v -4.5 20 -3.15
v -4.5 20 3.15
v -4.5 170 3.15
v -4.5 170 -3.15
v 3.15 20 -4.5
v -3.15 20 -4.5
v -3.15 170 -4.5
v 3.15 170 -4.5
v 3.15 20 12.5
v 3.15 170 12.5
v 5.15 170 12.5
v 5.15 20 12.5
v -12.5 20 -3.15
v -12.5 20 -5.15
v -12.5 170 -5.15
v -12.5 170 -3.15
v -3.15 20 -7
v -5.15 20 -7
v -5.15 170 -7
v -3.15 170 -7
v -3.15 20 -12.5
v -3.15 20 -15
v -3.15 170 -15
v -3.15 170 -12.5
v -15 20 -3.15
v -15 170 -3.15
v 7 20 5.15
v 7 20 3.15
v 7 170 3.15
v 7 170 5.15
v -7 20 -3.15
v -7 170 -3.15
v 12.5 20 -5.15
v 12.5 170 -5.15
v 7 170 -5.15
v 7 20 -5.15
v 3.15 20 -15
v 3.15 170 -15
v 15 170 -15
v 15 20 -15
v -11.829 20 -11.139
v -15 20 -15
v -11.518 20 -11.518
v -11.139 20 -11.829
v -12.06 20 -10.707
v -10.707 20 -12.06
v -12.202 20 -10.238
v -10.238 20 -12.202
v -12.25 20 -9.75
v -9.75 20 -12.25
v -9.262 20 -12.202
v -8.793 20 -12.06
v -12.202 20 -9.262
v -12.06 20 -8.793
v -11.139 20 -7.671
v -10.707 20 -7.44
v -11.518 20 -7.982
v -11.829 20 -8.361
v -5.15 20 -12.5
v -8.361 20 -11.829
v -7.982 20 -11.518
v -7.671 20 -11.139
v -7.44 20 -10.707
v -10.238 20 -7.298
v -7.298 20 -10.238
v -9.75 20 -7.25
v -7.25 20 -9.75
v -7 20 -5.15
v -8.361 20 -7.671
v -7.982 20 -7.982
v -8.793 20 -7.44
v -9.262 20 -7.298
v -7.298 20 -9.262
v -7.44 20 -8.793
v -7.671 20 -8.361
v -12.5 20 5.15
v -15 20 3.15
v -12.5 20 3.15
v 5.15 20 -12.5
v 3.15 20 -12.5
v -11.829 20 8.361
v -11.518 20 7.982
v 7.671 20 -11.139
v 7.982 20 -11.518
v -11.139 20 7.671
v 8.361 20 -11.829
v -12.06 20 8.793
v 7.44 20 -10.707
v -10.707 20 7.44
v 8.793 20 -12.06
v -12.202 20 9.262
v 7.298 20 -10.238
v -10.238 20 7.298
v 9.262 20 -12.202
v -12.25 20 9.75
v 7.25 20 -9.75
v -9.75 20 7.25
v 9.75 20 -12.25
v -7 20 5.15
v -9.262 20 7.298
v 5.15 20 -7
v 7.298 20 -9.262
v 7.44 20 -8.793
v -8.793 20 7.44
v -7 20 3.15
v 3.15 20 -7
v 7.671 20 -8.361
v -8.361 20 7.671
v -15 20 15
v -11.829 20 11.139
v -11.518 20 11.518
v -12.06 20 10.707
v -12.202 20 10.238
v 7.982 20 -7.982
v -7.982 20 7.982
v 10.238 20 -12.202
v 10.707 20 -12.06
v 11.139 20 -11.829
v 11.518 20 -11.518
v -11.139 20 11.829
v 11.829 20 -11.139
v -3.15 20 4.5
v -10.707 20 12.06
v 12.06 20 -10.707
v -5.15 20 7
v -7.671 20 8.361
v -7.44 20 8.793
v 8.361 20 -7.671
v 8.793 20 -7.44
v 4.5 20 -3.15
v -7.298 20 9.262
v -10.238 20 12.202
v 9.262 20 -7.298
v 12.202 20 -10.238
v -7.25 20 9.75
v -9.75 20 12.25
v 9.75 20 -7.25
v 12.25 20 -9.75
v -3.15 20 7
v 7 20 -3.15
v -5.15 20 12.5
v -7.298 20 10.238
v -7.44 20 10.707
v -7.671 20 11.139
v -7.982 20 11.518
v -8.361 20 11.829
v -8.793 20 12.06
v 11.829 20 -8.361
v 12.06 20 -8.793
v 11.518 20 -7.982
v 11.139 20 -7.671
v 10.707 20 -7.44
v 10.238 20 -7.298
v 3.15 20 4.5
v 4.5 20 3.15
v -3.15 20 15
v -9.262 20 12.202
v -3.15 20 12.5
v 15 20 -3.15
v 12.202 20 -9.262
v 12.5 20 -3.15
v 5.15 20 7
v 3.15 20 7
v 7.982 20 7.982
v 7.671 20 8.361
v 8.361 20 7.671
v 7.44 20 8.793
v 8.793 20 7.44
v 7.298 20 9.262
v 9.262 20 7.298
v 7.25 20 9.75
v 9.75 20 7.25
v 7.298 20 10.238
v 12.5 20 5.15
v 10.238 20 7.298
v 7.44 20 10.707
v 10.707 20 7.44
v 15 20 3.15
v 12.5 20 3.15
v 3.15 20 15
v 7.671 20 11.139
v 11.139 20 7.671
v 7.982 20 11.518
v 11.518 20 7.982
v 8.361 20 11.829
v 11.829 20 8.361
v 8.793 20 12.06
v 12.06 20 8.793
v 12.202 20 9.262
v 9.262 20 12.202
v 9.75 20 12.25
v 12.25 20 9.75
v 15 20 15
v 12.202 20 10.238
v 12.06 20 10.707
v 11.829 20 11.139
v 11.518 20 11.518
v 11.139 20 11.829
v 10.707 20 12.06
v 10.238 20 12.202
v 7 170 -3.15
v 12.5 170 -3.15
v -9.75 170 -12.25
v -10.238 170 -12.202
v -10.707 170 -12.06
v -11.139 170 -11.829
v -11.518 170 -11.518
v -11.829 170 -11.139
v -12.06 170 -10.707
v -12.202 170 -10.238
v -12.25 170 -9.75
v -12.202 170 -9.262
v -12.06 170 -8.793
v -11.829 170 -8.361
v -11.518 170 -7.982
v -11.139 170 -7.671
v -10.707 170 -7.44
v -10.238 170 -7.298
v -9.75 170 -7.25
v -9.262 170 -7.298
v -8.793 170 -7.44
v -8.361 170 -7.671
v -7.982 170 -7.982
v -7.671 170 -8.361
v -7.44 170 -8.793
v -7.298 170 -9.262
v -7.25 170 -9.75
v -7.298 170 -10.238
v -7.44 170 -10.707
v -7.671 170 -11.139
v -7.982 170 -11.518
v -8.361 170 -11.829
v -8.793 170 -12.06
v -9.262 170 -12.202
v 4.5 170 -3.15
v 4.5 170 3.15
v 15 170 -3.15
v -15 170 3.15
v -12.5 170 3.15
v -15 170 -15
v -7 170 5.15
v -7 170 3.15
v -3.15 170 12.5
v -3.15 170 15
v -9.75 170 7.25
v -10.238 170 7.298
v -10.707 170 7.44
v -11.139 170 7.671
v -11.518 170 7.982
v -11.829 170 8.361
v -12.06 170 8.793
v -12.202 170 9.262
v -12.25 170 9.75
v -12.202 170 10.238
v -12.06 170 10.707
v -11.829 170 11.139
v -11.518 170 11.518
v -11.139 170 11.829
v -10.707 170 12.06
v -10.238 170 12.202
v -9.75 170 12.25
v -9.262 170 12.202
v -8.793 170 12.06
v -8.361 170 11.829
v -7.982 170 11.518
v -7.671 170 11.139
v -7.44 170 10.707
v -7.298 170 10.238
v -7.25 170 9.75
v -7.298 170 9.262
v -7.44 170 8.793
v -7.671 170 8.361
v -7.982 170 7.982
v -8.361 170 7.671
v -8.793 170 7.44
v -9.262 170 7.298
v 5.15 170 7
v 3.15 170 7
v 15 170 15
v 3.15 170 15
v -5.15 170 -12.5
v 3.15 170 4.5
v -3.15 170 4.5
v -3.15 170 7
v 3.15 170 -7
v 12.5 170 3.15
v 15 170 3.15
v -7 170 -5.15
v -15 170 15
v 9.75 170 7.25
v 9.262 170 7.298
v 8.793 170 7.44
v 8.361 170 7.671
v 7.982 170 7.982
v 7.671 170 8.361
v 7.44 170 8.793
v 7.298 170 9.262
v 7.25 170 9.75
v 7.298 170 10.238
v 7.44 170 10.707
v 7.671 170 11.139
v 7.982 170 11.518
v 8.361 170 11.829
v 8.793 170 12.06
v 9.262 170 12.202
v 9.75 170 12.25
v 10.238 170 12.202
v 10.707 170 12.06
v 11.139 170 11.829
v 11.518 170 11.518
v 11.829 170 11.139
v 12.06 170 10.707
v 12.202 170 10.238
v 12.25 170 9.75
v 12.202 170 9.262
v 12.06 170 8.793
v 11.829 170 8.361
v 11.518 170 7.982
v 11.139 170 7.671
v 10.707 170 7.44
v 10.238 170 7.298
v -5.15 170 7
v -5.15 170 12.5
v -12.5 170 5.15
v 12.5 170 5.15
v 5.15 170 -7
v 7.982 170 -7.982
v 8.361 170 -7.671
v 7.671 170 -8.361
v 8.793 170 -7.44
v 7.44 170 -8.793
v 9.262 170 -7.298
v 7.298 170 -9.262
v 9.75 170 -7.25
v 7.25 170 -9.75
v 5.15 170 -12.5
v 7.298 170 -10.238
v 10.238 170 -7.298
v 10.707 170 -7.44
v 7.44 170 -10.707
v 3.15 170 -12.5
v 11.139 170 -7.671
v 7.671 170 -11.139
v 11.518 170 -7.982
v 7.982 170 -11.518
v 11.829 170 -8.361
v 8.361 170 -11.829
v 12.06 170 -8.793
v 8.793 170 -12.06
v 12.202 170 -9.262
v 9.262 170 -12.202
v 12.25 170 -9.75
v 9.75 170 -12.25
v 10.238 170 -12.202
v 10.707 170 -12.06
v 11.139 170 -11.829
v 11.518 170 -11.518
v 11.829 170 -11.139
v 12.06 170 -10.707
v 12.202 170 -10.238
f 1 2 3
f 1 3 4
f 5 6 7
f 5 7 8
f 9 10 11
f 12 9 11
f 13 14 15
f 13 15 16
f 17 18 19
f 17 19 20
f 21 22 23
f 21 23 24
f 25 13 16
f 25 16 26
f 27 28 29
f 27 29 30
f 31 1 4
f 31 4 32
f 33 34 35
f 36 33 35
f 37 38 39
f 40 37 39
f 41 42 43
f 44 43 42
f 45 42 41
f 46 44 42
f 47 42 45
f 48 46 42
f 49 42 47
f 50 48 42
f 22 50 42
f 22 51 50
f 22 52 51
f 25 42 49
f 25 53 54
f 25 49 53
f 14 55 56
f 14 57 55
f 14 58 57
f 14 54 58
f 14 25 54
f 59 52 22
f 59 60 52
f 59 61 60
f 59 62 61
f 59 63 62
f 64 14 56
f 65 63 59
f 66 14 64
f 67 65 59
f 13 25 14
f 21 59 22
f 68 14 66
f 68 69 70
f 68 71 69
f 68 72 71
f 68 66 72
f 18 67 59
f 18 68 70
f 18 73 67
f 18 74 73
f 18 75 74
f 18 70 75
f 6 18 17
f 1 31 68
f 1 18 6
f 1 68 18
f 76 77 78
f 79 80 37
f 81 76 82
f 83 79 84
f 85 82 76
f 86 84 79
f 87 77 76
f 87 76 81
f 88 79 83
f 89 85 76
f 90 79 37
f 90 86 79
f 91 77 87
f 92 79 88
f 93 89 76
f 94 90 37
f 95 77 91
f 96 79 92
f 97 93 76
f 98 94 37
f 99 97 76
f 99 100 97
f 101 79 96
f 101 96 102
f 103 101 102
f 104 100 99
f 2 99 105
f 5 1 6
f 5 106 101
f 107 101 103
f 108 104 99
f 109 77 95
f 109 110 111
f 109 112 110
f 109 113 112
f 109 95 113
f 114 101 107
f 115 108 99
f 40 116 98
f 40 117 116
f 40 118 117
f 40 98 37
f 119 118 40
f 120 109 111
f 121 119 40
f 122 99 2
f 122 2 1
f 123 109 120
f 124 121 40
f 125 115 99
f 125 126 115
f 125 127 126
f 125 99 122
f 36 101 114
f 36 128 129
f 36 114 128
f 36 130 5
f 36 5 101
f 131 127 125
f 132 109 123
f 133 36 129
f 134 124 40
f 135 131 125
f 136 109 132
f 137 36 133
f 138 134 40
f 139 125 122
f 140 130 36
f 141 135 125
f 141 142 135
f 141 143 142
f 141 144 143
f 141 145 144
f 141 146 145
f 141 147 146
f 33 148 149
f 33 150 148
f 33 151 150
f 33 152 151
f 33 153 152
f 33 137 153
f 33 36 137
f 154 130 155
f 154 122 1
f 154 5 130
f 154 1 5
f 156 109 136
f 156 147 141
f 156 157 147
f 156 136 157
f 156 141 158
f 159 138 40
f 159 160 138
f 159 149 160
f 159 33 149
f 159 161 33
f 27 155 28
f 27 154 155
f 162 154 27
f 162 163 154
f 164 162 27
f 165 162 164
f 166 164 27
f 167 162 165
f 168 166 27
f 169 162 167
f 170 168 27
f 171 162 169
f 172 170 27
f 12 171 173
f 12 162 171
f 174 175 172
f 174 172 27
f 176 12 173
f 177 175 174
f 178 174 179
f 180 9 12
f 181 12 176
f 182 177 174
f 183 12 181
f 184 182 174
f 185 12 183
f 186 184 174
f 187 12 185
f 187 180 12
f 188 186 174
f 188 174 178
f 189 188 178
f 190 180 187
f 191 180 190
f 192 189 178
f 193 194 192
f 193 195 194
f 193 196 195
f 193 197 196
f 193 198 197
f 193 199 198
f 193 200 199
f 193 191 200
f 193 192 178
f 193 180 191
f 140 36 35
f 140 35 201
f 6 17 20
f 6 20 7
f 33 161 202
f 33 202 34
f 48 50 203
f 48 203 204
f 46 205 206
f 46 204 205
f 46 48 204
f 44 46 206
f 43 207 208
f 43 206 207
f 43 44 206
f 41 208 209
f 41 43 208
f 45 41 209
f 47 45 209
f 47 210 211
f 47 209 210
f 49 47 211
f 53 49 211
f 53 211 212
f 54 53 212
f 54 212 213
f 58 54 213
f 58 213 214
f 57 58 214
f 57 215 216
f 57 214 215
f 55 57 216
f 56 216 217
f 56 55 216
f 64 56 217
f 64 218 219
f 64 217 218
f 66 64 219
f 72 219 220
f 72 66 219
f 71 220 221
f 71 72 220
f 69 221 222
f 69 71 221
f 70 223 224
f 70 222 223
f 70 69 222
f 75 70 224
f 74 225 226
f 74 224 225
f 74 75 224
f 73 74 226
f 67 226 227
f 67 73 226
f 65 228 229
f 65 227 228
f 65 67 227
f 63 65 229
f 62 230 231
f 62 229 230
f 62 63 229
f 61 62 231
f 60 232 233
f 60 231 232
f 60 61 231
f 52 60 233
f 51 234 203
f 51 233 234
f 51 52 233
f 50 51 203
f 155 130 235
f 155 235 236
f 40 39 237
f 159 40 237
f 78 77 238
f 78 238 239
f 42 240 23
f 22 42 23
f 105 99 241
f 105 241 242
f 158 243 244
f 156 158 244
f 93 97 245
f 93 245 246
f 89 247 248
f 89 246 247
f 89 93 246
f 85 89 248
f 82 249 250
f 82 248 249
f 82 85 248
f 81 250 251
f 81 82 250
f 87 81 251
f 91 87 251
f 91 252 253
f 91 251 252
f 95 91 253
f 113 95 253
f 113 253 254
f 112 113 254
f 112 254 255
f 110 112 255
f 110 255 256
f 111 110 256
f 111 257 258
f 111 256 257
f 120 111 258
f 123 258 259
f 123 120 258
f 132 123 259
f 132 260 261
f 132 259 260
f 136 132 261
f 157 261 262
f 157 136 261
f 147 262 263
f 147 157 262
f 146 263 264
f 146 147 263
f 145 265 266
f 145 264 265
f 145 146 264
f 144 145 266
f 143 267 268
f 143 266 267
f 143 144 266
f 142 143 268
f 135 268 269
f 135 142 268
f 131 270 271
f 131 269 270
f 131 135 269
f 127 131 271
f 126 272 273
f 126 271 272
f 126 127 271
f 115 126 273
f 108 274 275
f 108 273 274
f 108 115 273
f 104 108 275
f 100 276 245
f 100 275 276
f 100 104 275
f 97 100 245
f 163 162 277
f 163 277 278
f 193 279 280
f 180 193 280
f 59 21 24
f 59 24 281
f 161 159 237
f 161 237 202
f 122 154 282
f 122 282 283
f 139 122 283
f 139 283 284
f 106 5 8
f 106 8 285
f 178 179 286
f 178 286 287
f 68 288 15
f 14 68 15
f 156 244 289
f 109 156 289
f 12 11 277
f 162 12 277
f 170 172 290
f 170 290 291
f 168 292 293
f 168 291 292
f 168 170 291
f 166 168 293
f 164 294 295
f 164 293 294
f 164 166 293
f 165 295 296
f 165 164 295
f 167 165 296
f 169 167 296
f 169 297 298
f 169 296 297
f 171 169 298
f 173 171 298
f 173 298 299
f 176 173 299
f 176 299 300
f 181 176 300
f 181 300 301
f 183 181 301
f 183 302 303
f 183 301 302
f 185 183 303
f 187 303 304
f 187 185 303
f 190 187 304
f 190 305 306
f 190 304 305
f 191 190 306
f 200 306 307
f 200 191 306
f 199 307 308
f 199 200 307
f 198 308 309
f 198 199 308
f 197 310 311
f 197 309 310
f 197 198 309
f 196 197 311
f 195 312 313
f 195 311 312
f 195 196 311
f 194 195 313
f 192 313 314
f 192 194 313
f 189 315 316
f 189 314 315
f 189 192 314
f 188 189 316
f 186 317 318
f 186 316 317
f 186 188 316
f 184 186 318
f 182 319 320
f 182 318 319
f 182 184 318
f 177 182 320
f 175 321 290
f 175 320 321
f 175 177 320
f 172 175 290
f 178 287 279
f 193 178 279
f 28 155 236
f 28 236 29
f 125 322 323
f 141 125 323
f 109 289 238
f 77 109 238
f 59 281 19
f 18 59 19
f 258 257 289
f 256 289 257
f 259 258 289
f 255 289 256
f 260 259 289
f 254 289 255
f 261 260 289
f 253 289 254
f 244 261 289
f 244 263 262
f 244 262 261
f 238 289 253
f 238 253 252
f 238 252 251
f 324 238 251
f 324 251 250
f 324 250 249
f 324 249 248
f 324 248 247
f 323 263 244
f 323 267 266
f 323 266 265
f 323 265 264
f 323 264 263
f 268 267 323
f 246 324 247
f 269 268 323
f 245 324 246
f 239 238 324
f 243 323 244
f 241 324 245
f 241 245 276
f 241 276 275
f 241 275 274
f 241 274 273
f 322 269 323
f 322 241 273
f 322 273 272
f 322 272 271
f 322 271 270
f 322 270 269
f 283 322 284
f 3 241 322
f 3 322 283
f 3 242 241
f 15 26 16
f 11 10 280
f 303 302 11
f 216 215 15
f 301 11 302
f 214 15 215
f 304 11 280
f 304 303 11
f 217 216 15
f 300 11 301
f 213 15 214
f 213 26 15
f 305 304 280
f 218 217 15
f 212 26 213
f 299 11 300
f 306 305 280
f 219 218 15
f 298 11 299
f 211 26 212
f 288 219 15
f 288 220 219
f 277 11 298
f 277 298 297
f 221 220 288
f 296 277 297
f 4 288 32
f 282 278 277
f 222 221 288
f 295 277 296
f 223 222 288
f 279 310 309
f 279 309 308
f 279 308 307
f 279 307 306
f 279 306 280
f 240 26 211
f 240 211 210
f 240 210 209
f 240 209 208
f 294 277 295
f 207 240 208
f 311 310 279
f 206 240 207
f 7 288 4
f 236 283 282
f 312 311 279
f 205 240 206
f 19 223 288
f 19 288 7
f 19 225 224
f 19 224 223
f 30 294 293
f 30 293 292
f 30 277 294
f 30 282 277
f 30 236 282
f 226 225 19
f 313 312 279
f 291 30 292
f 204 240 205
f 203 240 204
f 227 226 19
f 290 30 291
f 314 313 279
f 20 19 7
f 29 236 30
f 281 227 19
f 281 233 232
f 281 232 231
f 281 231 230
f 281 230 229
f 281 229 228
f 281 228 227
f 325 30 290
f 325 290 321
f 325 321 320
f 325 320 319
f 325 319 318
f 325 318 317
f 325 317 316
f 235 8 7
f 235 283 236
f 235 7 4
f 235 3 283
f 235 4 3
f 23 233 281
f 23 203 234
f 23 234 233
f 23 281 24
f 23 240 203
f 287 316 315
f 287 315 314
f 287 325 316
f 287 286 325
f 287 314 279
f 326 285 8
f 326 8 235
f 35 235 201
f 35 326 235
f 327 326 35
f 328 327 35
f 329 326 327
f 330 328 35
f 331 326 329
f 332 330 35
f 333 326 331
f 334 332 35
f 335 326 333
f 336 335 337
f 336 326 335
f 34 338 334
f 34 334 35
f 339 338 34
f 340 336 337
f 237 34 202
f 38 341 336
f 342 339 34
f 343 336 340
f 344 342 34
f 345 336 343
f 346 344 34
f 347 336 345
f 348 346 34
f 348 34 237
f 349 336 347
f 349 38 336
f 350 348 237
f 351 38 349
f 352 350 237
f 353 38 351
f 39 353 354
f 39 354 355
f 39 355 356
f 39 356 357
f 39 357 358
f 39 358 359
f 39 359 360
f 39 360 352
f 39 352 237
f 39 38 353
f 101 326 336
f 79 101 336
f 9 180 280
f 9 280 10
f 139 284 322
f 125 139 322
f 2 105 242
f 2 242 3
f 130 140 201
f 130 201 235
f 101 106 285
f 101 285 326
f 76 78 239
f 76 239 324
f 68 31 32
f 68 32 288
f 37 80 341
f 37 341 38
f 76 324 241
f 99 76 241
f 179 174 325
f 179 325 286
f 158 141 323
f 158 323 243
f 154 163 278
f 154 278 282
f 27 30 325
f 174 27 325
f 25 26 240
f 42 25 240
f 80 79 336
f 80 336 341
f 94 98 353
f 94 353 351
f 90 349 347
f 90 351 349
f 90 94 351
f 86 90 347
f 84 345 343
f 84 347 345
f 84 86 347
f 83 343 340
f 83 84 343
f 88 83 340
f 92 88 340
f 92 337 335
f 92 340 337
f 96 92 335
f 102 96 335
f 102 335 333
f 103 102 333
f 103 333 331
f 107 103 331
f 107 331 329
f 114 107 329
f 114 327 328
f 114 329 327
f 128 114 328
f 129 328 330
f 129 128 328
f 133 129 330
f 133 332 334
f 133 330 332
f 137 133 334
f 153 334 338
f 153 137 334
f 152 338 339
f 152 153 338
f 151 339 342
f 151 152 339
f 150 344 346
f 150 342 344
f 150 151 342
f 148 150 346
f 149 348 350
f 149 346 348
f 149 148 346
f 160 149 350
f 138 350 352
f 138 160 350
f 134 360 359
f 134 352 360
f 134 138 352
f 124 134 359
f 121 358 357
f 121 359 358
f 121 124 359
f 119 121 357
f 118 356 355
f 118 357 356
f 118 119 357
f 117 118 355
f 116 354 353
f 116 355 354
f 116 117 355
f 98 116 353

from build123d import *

# Parameters (mm, degrees)
SKETCH_1_R          = 2.5
EXTRUDE_1_DEPTH     = 180
SKETCH_2_R          = 82.250528809
CUT_EXTRUDE_1_DEPTH = 10
SKETCH_3_R          = 47.359827943
CUT_EXTRUDE_2_DEPTH = 200


with BuildPart() as part:
    # 草图1 → 凸台-拉伸1 (new, symmetric)
    with BuildSketch(Plane(origin=(0, 0, 0), x_dir=(1, 0, 0), z_dir=(0, 1, 0))):
        Polygon((-15, -3.15), (-12.5, -3.15), (-12.5, -5.15), (-7, -5.15), (-7, -3.15), (-4.5, -3.15), (-4.5, 3.15), (-7, 3.15), (-7, 5.15), (-12.5, 5.15), (-12.5, 3.15), (-15, 3.15), (-15, 15), (-3.15, 15), (-3.15, 12.5), (-5.15, 12.5), (-5.15, 7), (-3.15, 7), (-3.15, 4.5), (3.15, 4.5), (3.15, 7), (5.15, 7), (5.15, 12.5), (3.15, 12.5), (3.15, 15), (15, 15), (15, 3.15), (12.5, 3.15), (12.5, 5.15), (7, 5.15), (7, 3.15), (4.5, 3.15), (4.5, -3.15), (7, -3.15), (7, -5.15), (12.5, -5.15), (12.5, -3.15), (15, -3.15), (15, -15), (3.15, -15), (3.15, -12.5), (5.15, -12.5), (5.15, -7), (3.15, -7), (3.15, -4.5), (-3.15, -4.5), (-3.15, -7), (-5.15, -7), (-5.15, -12.5), (-3.15, -12.5), (-3.15, -15), (-15, -15), align=None)
        with Locations(Location((-9.75, -9.75, 0), (0, 0, 90))):
            Circle(SKETCH_1_R, mode=Mode.SUBTRACT)
        with Locations(Location((-9.75, 9.75, 0), (0, 0, 90))):
            Circle(SKETCH_1_R, mode=Mode.SUBTRACT)
        with Locations(Location((9.75, 9.75, 0), (0, 0, 90))):
            Circle(SKETCH_1_R, mode=Mode.SUBTRACT)
        with Locations(Location((9.75, -9.75, 0), (0, 0, 90))):
            Circle(SKETCH_1_R, mode=Mode.SUBTRACT)
    extrude(amount=EXTRUDE_1_DEPTH, both=True)

    # 草图2 → 切除-拉伸1 (cut)
    with BuildSketch(Plane(origin=(0, 180, 0), x_dir=(1, 0, 0), z_dir=(0, 1, 0))):
        Circle(SKETCH_2_R)
    extrude(amount=-CUT_EXTRUDE_1_DEPTH, mode=Mode.SUBTRACT)

    # 草图3 → 切除-拉伸2 (cut)
    with BuildSketch(Plane.XZ.offset(180)):
        with Locations((0.216432031, -1.772037256)):
            Circle(SKETCH_3_R)
    extrude(amount=-CUT_EXTRUDE_2_DEPTH, mode=Mode.SUBTRACT)


solid = part.part
